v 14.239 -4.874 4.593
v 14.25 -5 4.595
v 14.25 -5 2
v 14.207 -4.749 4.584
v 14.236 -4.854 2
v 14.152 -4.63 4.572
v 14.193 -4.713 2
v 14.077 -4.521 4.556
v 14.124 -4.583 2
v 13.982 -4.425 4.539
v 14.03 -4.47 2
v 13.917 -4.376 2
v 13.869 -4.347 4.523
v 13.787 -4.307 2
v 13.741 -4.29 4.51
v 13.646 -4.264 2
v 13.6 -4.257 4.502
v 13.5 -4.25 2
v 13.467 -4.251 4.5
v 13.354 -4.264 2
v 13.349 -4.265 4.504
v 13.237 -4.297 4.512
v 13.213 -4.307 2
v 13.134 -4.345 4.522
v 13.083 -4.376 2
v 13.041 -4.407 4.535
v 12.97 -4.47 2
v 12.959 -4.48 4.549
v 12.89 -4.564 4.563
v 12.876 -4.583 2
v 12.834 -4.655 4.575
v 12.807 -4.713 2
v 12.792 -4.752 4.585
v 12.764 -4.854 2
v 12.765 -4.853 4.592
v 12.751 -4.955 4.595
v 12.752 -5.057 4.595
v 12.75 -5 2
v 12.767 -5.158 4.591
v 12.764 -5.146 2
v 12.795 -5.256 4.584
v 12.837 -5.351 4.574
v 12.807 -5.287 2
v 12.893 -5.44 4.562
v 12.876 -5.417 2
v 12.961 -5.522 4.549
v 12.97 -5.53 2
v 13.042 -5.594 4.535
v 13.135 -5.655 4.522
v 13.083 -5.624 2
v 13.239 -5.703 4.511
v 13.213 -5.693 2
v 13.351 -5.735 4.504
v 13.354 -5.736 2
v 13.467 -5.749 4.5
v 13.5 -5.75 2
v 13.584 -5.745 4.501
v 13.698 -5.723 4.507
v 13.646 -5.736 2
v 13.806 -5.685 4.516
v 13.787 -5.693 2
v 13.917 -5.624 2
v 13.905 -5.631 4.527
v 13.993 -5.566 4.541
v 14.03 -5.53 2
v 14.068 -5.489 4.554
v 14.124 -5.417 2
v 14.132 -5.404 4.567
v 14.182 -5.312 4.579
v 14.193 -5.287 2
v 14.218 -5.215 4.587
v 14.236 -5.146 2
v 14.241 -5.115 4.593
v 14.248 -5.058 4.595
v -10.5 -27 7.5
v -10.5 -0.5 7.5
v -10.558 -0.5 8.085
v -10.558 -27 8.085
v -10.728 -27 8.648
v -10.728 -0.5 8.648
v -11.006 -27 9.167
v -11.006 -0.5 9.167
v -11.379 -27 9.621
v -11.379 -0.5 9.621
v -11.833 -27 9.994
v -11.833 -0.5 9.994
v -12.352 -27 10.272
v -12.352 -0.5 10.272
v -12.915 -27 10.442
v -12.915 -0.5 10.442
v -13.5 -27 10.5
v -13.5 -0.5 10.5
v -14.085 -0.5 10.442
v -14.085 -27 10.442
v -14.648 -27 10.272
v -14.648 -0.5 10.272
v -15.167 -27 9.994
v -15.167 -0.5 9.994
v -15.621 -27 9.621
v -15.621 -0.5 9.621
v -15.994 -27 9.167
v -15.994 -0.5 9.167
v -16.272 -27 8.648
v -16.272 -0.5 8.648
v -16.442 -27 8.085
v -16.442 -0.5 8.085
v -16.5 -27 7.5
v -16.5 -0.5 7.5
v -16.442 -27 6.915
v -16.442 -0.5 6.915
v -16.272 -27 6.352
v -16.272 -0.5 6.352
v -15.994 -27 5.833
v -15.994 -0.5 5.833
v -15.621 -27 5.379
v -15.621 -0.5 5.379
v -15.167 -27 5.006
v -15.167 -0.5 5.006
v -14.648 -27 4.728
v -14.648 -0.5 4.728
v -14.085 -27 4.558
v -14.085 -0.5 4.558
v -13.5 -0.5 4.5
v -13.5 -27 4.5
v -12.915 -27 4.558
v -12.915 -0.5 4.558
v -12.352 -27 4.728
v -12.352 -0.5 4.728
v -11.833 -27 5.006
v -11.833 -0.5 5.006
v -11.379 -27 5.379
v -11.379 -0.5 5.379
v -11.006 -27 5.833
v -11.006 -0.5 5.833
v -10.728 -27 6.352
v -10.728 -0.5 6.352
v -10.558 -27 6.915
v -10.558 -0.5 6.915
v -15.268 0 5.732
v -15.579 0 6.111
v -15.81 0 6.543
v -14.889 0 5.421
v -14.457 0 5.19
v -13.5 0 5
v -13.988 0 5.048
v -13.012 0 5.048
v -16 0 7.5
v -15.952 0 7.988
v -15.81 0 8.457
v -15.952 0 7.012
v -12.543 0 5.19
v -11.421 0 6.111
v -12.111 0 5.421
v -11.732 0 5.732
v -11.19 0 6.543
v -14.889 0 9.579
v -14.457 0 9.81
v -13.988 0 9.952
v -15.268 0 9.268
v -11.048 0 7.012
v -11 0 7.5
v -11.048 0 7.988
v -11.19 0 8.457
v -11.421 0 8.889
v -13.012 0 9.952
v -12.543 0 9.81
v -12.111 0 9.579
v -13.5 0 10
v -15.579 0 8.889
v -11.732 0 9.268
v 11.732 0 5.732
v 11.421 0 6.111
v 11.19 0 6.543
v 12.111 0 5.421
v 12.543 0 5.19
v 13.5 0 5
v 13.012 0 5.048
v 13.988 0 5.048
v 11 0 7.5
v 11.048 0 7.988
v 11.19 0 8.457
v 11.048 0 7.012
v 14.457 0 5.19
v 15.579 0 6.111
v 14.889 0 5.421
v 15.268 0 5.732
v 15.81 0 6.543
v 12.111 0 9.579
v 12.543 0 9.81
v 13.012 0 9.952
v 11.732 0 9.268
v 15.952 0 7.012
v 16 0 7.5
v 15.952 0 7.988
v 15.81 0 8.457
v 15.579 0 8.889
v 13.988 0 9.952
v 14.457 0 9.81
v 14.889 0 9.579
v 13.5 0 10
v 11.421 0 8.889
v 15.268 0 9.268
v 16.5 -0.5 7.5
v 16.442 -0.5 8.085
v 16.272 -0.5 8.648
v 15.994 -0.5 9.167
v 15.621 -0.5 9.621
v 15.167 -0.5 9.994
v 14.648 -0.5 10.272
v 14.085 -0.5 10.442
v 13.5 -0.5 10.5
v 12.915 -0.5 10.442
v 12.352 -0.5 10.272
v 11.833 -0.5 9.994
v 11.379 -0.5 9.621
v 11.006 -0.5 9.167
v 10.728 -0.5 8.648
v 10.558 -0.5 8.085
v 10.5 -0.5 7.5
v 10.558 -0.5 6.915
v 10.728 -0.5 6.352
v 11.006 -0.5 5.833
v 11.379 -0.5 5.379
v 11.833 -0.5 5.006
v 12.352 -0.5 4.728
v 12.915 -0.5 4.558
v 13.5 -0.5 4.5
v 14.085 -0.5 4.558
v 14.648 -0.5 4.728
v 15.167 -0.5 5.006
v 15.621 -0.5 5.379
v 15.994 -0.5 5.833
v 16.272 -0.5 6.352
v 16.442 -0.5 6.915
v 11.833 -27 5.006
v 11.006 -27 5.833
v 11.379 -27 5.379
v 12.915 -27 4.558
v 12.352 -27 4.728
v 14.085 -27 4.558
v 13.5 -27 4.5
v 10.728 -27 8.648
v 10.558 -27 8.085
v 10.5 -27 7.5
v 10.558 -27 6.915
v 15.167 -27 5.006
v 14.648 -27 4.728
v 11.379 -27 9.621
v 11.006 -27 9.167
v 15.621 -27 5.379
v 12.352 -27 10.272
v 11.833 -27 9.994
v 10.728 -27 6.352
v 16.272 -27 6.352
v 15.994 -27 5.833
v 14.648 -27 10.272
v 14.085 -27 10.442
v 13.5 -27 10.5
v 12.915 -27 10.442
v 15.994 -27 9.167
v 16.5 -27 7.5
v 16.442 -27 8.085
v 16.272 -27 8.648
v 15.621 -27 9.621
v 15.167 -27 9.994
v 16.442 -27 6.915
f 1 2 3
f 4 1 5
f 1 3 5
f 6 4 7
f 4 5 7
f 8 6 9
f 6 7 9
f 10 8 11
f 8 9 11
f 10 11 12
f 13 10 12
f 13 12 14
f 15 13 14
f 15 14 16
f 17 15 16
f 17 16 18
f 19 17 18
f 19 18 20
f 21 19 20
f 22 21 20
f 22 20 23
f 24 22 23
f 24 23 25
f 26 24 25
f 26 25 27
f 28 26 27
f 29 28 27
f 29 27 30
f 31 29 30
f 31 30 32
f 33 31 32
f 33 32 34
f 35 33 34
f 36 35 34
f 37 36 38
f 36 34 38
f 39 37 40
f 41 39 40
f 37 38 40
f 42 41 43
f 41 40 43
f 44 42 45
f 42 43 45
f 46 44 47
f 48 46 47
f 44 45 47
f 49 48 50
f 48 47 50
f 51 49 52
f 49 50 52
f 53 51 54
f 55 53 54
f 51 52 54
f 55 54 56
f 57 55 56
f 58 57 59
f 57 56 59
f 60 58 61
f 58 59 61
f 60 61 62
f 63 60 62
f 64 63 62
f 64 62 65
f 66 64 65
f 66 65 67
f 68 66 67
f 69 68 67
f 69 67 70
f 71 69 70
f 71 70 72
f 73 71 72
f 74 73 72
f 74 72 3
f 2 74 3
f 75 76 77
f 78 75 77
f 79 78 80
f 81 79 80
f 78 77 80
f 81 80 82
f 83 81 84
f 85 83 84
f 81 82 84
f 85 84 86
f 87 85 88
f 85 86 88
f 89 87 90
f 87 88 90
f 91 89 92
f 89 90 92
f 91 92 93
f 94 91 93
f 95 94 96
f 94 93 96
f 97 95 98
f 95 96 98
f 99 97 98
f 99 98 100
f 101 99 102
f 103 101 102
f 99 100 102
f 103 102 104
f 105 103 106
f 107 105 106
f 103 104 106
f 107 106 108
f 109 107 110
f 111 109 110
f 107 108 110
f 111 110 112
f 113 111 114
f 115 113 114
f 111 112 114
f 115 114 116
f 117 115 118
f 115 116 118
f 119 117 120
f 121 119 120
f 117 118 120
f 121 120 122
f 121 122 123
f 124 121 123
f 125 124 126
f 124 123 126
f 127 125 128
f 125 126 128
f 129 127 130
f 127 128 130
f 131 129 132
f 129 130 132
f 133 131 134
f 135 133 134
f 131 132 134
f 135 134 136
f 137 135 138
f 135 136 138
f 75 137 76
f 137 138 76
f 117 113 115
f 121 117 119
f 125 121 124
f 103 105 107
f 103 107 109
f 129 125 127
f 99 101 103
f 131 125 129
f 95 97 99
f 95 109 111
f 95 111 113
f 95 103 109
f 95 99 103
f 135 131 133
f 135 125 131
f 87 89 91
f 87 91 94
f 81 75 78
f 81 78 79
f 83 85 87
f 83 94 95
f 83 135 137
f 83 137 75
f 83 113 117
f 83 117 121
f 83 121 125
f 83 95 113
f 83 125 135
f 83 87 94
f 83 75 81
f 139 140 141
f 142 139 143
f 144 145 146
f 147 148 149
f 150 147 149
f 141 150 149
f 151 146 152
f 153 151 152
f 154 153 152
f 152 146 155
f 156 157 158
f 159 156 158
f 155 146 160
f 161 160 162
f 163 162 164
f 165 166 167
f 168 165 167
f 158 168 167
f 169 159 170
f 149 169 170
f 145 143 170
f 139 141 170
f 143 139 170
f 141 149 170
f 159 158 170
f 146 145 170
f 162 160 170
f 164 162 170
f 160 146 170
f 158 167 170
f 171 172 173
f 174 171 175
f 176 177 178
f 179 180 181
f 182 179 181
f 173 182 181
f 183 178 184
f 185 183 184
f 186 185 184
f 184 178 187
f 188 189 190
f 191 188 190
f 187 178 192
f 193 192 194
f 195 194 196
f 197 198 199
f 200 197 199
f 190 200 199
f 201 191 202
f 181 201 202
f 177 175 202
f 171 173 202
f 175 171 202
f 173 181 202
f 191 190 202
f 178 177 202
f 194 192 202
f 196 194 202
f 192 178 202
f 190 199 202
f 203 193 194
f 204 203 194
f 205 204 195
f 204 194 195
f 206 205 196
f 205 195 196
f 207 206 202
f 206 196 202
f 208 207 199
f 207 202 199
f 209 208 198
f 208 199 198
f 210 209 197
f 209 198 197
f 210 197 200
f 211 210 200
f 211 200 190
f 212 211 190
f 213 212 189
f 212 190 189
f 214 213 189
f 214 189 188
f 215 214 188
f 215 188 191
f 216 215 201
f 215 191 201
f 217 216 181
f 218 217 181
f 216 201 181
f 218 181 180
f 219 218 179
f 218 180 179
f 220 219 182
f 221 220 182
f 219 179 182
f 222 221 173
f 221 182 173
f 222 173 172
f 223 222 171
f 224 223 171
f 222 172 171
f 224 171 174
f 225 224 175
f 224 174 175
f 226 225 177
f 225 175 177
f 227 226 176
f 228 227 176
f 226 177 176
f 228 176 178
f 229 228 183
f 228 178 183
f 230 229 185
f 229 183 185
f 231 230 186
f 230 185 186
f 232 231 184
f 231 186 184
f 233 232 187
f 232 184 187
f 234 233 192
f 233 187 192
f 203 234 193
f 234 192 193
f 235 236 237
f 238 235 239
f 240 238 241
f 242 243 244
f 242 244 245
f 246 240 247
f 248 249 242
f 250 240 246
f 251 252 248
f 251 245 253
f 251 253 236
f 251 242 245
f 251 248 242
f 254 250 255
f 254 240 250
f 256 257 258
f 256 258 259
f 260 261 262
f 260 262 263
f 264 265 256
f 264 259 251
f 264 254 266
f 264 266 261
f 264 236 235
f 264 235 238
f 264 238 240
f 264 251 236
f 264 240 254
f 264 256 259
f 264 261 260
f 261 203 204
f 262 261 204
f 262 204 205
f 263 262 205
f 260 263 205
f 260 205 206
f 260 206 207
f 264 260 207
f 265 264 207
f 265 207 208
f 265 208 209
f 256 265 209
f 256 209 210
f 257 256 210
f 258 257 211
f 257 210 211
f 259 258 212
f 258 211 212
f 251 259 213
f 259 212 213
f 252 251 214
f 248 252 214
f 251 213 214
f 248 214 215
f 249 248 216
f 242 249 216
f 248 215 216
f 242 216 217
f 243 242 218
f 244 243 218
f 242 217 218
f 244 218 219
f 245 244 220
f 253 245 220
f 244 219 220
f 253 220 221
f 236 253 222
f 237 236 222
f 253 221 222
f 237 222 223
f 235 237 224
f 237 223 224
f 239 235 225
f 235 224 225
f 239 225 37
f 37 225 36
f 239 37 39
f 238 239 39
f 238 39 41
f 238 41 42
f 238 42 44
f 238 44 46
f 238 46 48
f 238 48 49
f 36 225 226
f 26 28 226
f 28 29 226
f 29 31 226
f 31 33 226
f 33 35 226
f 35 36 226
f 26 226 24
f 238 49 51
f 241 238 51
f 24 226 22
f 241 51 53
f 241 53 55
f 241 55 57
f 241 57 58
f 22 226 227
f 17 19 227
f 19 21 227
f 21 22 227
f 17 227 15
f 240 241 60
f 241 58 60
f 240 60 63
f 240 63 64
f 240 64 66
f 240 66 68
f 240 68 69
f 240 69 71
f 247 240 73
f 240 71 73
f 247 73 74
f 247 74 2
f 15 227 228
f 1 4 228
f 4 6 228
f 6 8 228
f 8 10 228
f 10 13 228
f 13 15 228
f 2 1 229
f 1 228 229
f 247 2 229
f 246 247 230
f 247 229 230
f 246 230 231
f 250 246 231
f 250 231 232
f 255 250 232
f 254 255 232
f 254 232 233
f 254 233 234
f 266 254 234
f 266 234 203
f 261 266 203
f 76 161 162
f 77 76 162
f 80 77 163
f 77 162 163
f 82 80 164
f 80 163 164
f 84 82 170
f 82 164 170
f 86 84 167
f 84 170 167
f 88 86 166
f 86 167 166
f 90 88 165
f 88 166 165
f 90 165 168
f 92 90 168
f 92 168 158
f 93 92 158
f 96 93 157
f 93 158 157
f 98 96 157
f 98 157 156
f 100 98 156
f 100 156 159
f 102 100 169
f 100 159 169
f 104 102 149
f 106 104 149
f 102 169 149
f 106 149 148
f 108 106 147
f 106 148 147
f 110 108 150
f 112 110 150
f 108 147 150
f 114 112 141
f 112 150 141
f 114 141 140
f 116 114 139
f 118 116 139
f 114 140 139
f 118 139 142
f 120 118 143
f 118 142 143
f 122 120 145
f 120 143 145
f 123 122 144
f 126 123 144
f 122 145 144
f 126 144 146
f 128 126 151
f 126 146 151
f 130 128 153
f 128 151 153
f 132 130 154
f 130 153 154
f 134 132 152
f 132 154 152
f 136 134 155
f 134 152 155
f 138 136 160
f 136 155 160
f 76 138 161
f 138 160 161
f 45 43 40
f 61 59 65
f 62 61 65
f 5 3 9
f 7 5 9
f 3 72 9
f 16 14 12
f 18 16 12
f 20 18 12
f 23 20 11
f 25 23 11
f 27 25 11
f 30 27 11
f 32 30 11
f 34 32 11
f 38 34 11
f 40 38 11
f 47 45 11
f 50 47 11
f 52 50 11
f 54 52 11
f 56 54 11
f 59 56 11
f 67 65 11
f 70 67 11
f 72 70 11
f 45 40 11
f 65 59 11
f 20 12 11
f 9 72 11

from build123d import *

# Parameters (mm, degrees)
F0_R      = 3
F1_DEPTH  = 27
F2_SIZE   = 0.5
F2_2_SIZE = 0.5
F4_START  = 2
F4_DEPTH  = 3


with BuildPart() as f1:
    # F0 (on Front) → F1 (new body)
    with BuildSketch(Plane.XZ):
        with Locations((-13.5, 7.5)):
            Circle(F0_R)
    extrude(amount=F1_DEPTH)

    # F2
    f2_edges = [f1.edges().sort_by_distance(p)[0] for p in [
        (-16.5, 0, 7.5),
    ]]
    chamfer(f2_edges, length=F2_SIZE)


with BuildPart() as f1b:
    # F0 (on Front) → F1, piece 2 (new body)
    with BuildSketch(Plane.XZ):
        with Locations((13.5, 7.5)):
            Circle(F0_R)
    extrude(amount=F1_DEPTH)

    # F2#2
    f2_2_edges = [f1b.edges().sort_by_distance(p)[0] for p in [
        (10.5, 0, 7.5),
    ]]
    chamfer(f2_2_edges, length=F2_2_SIZE)

    # F3 (on Top) → F4 (join)
    with BuildSketch(Plane.XY.offset(F4_START)):
        with BuildLine():
            ThreePointArc((12.75, -5), (13.5, -5.75), (14.25, -5))
            ThreePointArc((14.25, -5), (13.5, -4.25), (12.75, -5))
        make_face()
    extrude(amount=F4_DEPTH)


solid = Compound([f1.part, f1b.part])
